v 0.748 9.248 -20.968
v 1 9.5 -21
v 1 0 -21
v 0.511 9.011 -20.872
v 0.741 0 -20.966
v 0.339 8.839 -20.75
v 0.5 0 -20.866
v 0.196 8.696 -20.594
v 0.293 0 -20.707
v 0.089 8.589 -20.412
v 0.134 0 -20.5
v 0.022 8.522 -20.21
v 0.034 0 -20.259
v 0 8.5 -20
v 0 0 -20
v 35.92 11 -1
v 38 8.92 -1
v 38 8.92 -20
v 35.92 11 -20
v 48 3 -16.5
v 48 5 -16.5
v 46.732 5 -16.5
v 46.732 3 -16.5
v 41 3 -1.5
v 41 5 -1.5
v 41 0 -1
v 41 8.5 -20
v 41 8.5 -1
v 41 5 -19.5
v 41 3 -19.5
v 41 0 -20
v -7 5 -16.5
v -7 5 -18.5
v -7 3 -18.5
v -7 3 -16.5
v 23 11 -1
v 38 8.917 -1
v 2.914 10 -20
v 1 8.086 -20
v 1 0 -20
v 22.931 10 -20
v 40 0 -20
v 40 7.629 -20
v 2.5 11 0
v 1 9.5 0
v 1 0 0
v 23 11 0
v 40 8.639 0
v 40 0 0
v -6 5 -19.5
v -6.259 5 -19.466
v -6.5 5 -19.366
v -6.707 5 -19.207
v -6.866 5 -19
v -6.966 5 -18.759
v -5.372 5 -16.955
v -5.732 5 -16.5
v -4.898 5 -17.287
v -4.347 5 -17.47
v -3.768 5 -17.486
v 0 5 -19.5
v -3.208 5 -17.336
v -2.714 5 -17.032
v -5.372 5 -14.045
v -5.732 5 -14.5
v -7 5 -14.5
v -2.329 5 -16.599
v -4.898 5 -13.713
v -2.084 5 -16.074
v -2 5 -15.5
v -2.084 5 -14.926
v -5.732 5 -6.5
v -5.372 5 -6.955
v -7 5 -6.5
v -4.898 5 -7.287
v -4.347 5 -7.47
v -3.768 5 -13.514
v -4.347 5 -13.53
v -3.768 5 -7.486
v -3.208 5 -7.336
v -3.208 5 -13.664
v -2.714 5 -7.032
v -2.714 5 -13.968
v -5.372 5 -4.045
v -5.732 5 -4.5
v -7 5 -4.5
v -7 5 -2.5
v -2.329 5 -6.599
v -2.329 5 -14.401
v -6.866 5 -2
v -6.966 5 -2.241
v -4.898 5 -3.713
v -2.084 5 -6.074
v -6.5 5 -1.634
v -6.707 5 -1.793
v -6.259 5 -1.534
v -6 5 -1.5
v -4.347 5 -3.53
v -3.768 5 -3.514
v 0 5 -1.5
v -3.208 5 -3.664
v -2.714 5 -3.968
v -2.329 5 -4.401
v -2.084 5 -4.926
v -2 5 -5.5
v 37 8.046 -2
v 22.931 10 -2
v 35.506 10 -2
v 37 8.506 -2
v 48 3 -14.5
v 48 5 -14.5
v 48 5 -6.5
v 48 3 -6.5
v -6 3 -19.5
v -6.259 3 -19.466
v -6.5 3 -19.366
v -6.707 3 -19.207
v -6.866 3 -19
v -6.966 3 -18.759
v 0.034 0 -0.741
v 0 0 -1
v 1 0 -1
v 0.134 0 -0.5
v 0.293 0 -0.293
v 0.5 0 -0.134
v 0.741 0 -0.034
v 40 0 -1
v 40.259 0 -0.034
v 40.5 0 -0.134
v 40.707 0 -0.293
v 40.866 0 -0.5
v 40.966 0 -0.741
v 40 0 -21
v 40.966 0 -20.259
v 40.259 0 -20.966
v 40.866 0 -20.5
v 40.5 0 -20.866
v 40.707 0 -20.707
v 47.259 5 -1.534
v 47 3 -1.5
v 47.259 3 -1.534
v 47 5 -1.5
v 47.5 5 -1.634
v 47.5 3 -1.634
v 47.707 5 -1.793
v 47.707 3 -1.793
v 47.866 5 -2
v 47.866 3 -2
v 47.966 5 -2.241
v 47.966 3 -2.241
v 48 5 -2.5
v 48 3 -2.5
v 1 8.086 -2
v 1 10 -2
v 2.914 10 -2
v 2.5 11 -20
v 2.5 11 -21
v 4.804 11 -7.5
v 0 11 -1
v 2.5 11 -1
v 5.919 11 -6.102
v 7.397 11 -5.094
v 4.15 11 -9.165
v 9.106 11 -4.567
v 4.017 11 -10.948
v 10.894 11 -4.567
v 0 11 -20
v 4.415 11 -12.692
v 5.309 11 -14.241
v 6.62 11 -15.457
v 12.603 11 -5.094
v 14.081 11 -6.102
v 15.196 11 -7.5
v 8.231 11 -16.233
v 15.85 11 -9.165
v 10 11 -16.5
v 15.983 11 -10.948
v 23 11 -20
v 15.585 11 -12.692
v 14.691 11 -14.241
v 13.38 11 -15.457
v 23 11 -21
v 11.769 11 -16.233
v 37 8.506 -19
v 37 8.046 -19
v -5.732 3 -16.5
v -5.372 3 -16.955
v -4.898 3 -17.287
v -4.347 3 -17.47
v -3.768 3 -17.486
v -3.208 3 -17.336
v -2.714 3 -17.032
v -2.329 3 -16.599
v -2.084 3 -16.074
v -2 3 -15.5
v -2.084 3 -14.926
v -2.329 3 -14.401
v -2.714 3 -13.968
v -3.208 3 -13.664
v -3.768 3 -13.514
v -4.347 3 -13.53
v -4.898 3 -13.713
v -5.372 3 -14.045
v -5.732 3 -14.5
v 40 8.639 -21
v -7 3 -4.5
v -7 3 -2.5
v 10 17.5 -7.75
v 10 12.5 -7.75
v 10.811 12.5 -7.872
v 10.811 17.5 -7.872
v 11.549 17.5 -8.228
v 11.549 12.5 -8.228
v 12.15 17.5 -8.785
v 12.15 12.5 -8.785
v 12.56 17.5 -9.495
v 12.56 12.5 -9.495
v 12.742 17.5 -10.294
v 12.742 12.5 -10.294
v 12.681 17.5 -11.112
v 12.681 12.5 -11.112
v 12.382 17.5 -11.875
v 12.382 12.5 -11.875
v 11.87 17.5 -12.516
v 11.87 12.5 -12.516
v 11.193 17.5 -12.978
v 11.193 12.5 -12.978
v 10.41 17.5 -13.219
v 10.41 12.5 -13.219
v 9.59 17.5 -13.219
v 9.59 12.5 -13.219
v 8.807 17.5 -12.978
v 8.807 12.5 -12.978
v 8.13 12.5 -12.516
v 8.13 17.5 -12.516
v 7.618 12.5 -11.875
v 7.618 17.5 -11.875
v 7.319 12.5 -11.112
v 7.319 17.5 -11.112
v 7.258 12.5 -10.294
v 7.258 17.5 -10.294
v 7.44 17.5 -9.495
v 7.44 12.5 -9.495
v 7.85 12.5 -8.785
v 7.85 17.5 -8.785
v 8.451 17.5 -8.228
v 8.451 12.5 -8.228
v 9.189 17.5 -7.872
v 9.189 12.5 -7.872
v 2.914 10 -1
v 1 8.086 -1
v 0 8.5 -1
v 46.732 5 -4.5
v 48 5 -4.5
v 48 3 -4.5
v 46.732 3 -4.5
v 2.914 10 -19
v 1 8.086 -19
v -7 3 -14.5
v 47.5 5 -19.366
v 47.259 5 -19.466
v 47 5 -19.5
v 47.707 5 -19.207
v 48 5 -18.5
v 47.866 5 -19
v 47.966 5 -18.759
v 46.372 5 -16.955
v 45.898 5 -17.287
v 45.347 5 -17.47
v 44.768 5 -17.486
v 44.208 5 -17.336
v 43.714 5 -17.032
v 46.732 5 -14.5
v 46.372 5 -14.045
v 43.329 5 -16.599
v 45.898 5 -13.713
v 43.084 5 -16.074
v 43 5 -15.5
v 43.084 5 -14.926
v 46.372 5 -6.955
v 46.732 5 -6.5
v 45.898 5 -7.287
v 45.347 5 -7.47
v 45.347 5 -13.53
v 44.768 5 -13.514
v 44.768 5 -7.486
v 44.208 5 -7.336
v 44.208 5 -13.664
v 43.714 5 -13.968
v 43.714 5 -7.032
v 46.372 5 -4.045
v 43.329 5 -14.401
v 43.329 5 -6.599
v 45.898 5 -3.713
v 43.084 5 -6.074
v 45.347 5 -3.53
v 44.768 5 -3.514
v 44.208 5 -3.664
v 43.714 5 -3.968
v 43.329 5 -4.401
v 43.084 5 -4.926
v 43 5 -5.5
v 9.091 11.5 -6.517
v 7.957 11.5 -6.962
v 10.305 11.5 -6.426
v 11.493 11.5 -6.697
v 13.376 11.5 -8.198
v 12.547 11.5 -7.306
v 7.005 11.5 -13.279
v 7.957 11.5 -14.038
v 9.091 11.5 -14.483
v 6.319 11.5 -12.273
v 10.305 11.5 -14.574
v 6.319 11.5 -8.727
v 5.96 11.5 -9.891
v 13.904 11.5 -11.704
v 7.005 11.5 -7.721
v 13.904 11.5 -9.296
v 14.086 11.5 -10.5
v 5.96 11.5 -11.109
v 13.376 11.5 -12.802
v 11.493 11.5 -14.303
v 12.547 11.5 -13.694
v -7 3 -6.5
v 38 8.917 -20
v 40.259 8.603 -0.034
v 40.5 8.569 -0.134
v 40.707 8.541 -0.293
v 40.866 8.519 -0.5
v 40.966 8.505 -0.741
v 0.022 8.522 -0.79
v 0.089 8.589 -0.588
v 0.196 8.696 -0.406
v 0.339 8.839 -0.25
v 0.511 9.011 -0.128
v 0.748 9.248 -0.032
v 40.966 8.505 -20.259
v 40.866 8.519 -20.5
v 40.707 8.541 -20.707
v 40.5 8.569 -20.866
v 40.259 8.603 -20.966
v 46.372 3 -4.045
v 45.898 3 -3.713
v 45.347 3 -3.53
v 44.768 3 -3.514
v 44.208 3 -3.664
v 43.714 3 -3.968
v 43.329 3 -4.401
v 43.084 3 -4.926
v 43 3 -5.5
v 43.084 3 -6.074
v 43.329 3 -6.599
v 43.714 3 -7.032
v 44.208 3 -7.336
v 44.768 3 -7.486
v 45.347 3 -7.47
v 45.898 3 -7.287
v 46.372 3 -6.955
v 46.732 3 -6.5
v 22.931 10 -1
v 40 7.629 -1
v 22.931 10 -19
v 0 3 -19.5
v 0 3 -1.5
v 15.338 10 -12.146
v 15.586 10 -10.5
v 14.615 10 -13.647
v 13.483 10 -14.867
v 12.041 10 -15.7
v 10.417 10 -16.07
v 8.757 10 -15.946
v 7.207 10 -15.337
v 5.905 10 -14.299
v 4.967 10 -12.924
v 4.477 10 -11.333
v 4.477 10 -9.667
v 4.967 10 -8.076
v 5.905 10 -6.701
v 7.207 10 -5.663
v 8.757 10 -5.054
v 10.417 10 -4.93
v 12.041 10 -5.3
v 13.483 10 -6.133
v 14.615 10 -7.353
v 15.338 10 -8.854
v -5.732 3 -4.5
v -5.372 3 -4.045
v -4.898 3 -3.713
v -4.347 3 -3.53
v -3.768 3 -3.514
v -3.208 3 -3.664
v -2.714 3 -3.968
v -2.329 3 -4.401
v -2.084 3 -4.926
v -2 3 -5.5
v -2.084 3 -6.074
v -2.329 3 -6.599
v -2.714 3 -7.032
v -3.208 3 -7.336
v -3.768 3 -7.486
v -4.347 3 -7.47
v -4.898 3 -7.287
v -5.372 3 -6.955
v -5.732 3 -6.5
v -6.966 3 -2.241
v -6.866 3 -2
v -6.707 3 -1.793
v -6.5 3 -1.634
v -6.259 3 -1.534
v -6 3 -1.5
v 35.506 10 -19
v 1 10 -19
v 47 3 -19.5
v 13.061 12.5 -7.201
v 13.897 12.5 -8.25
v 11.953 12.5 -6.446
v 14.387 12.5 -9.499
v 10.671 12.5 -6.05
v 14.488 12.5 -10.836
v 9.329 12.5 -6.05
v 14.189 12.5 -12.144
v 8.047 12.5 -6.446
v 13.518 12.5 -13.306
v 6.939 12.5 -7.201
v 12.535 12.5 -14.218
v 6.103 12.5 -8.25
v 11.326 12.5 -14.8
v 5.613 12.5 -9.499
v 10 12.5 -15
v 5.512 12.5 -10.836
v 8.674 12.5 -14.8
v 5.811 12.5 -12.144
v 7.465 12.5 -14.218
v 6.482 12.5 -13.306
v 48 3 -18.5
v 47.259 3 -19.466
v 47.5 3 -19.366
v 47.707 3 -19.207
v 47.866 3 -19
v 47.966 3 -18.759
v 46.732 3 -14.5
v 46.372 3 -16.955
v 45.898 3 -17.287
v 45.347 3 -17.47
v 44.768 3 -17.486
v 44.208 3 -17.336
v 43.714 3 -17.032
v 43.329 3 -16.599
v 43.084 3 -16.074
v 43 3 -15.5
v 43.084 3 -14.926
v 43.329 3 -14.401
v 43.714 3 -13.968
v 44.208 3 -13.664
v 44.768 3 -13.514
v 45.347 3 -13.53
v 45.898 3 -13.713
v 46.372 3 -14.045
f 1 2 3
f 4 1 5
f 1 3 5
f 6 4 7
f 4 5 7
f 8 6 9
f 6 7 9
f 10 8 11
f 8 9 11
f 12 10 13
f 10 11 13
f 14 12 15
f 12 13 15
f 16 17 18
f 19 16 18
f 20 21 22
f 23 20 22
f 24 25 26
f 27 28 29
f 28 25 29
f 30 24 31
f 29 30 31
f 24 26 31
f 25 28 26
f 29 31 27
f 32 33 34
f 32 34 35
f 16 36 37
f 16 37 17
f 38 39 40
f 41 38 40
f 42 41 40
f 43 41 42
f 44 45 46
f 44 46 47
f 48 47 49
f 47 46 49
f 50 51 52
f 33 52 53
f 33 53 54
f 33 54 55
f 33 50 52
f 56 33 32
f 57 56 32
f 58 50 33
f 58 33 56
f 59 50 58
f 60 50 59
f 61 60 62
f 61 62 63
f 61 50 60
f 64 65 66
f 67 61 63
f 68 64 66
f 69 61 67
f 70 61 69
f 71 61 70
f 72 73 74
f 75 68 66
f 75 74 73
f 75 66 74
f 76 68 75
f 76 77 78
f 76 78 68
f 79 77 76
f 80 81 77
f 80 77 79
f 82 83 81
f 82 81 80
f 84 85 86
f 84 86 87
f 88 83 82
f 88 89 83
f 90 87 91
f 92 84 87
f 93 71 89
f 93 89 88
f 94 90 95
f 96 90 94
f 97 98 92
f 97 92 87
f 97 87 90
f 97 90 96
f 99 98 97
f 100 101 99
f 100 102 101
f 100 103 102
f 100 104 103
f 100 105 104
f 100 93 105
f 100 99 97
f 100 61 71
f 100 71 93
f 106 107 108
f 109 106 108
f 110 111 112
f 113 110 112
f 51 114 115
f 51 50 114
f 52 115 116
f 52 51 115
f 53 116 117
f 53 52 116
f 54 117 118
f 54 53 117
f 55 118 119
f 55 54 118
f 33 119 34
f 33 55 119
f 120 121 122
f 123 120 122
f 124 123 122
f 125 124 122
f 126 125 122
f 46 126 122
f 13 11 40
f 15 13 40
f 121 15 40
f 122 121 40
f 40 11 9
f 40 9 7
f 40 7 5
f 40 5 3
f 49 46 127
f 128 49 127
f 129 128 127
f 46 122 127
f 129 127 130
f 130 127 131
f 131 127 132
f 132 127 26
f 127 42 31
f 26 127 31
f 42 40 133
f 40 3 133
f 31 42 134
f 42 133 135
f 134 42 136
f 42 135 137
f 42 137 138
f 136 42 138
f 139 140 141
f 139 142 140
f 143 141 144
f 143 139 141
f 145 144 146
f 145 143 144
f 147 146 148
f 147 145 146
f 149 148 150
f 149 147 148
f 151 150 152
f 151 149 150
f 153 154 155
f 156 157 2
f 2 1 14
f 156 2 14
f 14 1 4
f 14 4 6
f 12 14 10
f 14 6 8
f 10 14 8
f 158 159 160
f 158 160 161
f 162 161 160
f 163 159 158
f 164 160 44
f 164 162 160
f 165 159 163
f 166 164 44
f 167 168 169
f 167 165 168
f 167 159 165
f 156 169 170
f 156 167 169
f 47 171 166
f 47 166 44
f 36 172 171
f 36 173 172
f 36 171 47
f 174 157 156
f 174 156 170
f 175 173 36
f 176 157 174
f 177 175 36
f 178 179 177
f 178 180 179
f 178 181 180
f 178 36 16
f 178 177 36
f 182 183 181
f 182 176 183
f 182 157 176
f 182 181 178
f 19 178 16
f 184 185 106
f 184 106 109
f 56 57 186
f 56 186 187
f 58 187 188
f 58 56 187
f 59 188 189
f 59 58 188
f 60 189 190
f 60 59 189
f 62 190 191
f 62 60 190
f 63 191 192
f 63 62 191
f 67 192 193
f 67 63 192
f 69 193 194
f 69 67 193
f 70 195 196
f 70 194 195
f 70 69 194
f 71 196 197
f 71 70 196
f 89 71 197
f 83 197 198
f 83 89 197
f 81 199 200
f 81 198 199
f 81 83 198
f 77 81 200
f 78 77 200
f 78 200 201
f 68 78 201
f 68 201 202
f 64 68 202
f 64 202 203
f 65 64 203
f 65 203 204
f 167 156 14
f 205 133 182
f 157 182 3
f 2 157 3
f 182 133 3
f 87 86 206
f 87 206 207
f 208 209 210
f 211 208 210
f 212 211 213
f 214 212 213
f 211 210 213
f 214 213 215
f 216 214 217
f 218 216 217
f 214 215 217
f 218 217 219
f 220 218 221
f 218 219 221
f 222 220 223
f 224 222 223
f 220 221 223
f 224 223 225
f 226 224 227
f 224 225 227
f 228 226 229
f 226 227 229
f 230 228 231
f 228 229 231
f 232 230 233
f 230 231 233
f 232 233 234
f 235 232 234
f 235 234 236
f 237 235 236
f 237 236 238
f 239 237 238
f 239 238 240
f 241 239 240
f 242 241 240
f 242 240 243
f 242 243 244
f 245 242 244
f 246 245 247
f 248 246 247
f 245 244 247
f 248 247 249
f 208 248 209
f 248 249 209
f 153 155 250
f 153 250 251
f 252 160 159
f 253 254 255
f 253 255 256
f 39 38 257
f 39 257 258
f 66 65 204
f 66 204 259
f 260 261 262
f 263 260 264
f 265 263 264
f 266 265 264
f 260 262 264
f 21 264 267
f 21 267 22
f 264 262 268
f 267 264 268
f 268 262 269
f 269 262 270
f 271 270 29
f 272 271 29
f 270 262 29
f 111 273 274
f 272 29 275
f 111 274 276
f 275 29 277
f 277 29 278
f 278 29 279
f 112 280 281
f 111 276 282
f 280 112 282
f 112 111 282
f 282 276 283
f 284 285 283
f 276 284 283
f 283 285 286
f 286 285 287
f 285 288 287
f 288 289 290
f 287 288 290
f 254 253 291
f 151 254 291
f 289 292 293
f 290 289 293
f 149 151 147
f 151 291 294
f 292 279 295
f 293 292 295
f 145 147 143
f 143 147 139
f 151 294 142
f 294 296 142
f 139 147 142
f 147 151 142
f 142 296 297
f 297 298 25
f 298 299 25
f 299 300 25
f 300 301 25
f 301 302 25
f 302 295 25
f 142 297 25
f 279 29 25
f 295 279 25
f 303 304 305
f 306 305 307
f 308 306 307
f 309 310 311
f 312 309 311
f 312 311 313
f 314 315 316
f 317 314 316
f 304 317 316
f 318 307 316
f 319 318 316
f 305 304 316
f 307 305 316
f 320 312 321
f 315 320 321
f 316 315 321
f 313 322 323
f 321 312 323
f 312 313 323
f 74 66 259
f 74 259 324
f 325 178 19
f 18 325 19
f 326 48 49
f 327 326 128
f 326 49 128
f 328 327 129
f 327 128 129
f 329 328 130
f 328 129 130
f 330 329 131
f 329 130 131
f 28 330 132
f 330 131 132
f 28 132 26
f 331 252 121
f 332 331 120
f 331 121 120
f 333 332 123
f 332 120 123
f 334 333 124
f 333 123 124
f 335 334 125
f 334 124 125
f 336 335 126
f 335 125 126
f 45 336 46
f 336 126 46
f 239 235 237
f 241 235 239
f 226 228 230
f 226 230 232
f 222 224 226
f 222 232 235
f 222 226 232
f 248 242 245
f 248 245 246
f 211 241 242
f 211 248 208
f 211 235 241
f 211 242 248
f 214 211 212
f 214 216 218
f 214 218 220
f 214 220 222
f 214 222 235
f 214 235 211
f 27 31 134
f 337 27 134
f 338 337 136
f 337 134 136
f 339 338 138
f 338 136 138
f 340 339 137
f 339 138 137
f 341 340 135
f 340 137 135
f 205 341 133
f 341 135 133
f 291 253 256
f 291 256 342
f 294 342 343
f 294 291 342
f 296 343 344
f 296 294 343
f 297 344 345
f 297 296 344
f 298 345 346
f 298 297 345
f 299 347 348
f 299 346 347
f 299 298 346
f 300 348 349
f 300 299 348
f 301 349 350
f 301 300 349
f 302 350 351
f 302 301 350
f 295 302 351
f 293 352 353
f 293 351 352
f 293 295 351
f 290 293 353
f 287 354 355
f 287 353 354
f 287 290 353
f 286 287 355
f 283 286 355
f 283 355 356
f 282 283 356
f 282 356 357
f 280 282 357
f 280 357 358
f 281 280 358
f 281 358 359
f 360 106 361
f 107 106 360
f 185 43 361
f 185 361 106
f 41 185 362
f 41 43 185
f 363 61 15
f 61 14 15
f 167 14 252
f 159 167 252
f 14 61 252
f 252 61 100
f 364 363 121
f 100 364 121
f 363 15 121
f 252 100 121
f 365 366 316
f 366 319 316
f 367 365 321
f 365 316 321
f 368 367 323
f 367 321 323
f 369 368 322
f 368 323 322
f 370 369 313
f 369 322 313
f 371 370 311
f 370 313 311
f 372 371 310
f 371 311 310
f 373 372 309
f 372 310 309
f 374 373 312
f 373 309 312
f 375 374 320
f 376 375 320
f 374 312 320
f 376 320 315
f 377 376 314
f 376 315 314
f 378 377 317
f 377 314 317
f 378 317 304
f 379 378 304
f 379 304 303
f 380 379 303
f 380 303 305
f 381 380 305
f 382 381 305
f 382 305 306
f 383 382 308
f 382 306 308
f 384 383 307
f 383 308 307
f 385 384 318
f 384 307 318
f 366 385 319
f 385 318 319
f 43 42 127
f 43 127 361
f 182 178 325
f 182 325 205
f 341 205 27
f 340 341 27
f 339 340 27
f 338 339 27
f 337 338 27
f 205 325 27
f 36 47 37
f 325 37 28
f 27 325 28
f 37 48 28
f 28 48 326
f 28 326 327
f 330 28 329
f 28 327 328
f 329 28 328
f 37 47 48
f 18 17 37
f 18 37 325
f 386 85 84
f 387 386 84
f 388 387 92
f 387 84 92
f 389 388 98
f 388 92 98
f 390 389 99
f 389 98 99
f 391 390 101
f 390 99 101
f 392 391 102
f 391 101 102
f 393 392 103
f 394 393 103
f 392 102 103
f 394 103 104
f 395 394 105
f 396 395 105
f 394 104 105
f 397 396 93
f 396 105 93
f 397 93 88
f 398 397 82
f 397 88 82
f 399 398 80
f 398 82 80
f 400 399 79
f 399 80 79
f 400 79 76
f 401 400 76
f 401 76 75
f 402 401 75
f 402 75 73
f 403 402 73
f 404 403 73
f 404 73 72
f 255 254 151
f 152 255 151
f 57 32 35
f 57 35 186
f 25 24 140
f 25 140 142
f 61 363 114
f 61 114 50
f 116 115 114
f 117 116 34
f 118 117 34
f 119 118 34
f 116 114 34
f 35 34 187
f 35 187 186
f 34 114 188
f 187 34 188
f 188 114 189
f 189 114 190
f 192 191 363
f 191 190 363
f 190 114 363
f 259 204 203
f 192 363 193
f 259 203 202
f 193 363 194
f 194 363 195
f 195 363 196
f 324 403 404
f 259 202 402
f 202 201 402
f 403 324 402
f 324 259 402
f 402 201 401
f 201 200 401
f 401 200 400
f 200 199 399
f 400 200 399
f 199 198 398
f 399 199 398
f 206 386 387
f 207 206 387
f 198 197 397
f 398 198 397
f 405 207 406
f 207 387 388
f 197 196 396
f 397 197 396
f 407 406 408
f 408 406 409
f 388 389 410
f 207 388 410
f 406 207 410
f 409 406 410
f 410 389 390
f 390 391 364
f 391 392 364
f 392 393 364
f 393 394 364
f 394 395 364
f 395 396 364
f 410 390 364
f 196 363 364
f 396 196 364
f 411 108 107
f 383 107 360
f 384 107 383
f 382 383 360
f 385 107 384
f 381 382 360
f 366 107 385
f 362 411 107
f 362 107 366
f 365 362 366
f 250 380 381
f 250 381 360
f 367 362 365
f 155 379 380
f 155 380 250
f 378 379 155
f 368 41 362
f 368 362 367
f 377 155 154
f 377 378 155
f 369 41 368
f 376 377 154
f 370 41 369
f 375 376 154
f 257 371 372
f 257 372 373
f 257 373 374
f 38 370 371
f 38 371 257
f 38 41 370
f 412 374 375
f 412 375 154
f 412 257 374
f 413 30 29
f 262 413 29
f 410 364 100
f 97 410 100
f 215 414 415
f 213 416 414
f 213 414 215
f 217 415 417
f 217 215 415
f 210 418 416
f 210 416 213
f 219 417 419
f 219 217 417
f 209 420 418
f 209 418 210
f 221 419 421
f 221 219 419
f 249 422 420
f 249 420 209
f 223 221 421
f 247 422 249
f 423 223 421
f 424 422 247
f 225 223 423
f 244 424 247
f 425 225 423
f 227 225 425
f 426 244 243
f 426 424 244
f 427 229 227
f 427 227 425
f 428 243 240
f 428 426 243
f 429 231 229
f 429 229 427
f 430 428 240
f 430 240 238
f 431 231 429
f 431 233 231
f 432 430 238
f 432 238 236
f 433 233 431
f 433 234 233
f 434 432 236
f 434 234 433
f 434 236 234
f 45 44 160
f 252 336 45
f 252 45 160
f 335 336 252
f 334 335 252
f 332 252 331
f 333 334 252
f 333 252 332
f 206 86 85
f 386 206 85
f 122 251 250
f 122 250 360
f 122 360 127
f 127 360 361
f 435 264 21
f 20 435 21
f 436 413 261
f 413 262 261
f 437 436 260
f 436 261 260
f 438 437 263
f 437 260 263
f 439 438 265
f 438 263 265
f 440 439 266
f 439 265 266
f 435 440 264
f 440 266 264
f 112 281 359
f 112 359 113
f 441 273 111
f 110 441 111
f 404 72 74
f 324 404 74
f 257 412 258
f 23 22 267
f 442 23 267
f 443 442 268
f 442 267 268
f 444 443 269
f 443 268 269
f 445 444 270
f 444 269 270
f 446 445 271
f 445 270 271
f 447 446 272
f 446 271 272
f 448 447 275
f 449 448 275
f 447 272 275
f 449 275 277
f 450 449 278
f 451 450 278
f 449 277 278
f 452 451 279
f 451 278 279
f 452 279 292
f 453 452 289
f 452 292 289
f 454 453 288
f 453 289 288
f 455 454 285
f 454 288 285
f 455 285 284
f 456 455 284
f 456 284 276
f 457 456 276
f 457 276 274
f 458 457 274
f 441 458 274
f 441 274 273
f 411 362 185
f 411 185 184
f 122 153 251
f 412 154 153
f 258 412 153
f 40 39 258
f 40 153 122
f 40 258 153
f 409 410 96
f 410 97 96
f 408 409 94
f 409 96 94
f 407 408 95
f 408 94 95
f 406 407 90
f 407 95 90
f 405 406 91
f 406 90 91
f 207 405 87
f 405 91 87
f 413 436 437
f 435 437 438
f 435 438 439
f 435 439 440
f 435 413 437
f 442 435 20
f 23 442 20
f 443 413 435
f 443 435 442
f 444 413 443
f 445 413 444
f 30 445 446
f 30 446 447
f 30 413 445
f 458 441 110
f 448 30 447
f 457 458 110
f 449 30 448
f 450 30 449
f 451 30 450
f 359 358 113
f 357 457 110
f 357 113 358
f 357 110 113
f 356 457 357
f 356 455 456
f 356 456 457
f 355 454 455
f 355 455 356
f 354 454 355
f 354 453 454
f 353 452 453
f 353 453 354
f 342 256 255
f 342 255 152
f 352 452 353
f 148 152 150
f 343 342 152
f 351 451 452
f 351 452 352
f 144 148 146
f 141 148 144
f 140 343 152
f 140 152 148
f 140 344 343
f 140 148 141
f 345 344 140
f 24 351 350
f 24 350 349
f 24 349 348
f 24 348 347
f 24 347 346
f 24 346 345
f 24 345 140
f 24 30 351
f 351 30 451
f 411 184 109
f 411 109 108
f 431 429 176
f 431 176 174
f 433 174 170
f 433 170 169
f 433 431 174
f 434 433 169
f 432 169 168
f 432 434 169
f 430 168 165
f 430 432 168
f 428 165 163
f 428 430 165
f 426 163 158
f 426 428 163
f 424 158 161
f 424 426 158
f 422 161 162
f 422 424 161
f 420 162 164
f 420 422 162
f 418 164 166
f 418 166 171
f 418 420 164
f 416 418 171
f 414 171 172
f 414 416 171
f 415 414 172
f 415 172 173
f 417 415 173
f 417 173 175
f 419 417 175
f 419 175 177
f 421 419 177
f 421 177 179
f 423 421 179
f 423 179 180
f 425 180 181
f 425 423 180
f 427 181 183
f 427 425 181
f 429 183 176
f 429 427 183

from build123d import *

# Parameters (mm, degrees)
BOSS_EXTRU_1_DEPTH      = 11
ENL_V_MAT_EXTRU_1_DEPTH = 48.360320945
ESQUISSE6_W             = 24.300768243
ESQUISSE6_H             = 19
BOSS_EXTRU_2_DEPTH      = 5
CHANFREIN1_SIZE         = 2.08
ESQUISSE7_R             = 6
BOSS_EXTRU_3_DEPTH      = 1.5
CHANFREIN2_SIZE         = 1.5
ENL_V_MAT_EXTRU_2_DEPTH = 1
ENL_V_MAT_EXTRU_3_DEPTH = 1
ESQUISSE11_W            = 18
ESQUISSE11_H            = 2
BOSS_EXTRU_4_DEPTH      = 7
ENL_V_MAT_EXTRU_5_DEPTH = 47.671725916
CONG_1_R                = 1
CONG_1_OF_SYM_TRIE1_R   = 1
COQUE1_START            = -20
COQUE1_DEPTH            = 19
COQUE1_START_2          = -19
COQUE1_2_DEPTH          = 17
ESQUISSE18_R            = 2.75
BOSS_EXTRU_5_DEPTH      = 5


with BuildPart() as part:
    # Esquisse3 → Boss.-Extru.1 (new body)
    with BuildSketch(Plane(origin=(0, 0, 0), x_dir=(1, 0, 0), z_dir=(0, 1, 0))):
        with BuildLine():
            Line((1, 0), (40, 0))
            ThreePointArc((40, 0), (40.707106781, 0.292893219), (41, 1))
            Line((41, 1), (41, 20))
            ThreePointArc((41, 20), (40.707106781, 20.707106781), (40, 21))
            Line((40, 21), (1, 21))
            ThreePointArc((1, 21), (0.292893219, 20.707106781), (0, 20))
            Line((0, 20), (0, 1))
            ThreePointArc((0, 1), (0.292893219, 0.292893219), (1, 0))
        make_face()
    extrude(amount=BOSS_EXTRU_1_DEPTH)

    # Esquisse4 → Enlèv. mat.-Extru.1 (cut, through all)
    with BuildSketch(Plane.XY):
        Polygon((41, 11), (23, 11), (41, 8.5), align=None)
    extrude(amount=-ENL_V_MAT_EXTRU_1_DEPTH, mode=Mode.SUBTRACT)

    # Esquisse6 → Boss.-Extru.2 (add)
    with BuildSketch(Plane(origin=(0, 11, 0), x_dir=(1, 0, 0), z_dir=(0, 1, 0))):
        with Locations((25.849615878, 10.5)):
            Rectangle(ESQUISSE6_W, ESQUISSE6_H)
    extrude(amount=-BOSS_EXTRU_2_DEPTH)

    # Chanfrein1
    chanfrein1_edges = [part.edges().sort_by_distance(p)[0] for p in [
        (38, 11, -10.5),
    ]]
    chamfer(chanfrein1_edges, length=CHANFREIN1_SIZE)

    # Esquisse7 → Boss.-Extru.3 (add)
    with BuildSketch(Plane(origin=(0, 11, 0), x_dir=(1, 0, 0), z_dir=(0, 1, 0))):
        with Locations(Location((10, 10.5, 0), (0, 0, 90))):
            Circle(ESQUISSE7_R)
    extrude(amount=BOSS_EXTRU_3_DEPTH)

    # Chanfrein2
    chanfrein2_edges = [part.edges().sort_by_distance(p)[0] for p in [
        (10, 12.5, -4.5),
    ]]
    chamfer(chanfrein2_edges, length=CHANFREIN2_SIZE - 0.0001)  # a hair under: the kernel refuses the full size

    # Esquisse8 → Enlèv. mat.-Extru.2 (cut)
    with BuildSketch(Plane.XY):
        Polygon((0, 11), (2.5, 11), (0, 8.5), align=None)
    extrude(amount=-ENL_V_MAT_EXTRU_2_DEPTH, mode=Mode.SUBTRACT)

    # Esquisse9 → Enlèv. mat.-Extru.3 (cut)
    with BuildSketch(Plane(origin=(0, 0, -21), x_dir=(-1, 0, 0), z_dir=(0, 0, -1))):
        Polygon((0, 11), (-2.5, 11), (0, 8.5), align=None)
    extrude(amount=-ENL_V_MAT_EXTRU_3_DEPTH, mode=Mode.SUBTRACT)

    # Esquisse11 → Boss.-Extru.4 (add)
    with BuildSketch(Plane.ZY):
        with Locations((-10.5, 4)):
            Rectangle(ESQUISSE11_W, ESQUISSE11_H)
    boss_extru_4 = extrude(amount=BOSS_EXTRU_4_DEPTH)

    # Esquisse15 → Enlèv. mat.-Extru.5 (cut, through all)
    with BuildSketch(Plane(origin=(0, 5, 0), x_dir=(1, 0, 0), z_dir=(0, 1, 0))):
        with BuildLine():
            Line((-9.636099445, 16.5), (-5.732050808, 16.5))
            ThreePointArc((-5.732050808, 16.5), (-2, 15.5), (-5.732050808, 14.5))
            Line((-5.732050808, 14.5), (-9.636099445, 14.5))
            Line((-9.636099445, 14.5), (-9.636099445, 16.5))
        make_face()
        with BuildLine():
            Line((-9.636099445, 4.5), (-5.732050808, 4.5))
            ThreePointArc((-5.732050808, 4.5), (-2, 5.5), (-5.732050808, 6.5))
            Line((-5.732050808, 6.5), (-9.636099445, 6.5))
            Line((-9.636099445, 6.5), (-9.636099445, 4.5))
        make_face()
    enl_v_mat_extru_5 = extrude(amount=-ENL_V_MAT_EXTRU_5_DEPTH, mode=Mode.SUBTRACT)

    # Congé1
    cong_1_edges = [part.edges().sort_by_distance(p)[0] for p in [
        (-7, 4, -19.5),
        (-7, 4, -1.5),
    ]]
    fillet(cong_1_edges, radius=CONG_1_R)

    # Symétrie1: Boss.-Extru.4, Enlèv. mat.-Extru.5 across plane
    add(boss_extru_4.mirror(Plane.ZY.offset(-20.5)))
    add(enl_v_mat_extru_5.mirror(Plane.ZY.offset(-20.5)), mode=Mode.SUBTRACT)

    # Congé1 of Symétrie1
    cong_1_of_sym_trie1_edges = [part.edges().sort_by_distance(p)[0] for p in [
        (48, 4, -19.5),
        (48, 4, -1.5),
    ]]
    fillet(cong_1_of_sym_trie1_edges, radius=CONG_1_OF_SYM_TRIE1_R)

    # Coque1: read off the stored shape, not the designer's step
    # Coque1 outline → Coque1 (cut)
    with BuildSketch(Plane.XY.offset(COQUE1_START)):
        Polygon((1, 8.085786438), (1, 0), (40, 0), (40, 7.629289897), (22.930887262, 10), (2.914213562, 10), align=None)
    extrude(amount=COQUE1_DEPTH, mode=Mode.SUBTRACT)

    # Coque1 2 outline → Coque1 2 (cut)
    with BuildSketch(Plane.XY.offset(COQUE1_START_2)):
        Polygon((1, 10), (1, 8.085786438), (2.914213562, 10), align=None)
        Polygon((35.505786438, 10), (22.930887262, 10), (37, 8.045956564), (37, 8.505786438), align=None)
    extrude(amount=COQUE1_2_DEPTH, mode=Mode.SUBTRACT)

    # Coque1 3 outline → Coque1 3 (revolve, cut)
    with BuildSketch(Plane(origin=(10, 0, -10.5), x_dir=(1, 0, 0), z_dir=(0, 0, 1))):
        Polygon((4.085786438, 11.5), (0, 11.5), (0, 10), (5.585786438, 10), align=None)
    revolve(axis=Axis((10, 0, -10.5), (0, 1, 0)), mode=Mode.SUBTRACT)

    # Esquisse18 → Boss.-Extru.5 (add)
    with BuildSketch(Plane(origin=(0, 12.5, 0), x_dir=(1, 0, 0), z_dir=(0, 1, 0))):
        with Locations(Location((10, 10.5, 0), (0, 0, 270))):
            Circle(ESQUISSE18_R)
    extrude(amount=BOSS_EXTRU_5_DEPTH)


solid = part.part
